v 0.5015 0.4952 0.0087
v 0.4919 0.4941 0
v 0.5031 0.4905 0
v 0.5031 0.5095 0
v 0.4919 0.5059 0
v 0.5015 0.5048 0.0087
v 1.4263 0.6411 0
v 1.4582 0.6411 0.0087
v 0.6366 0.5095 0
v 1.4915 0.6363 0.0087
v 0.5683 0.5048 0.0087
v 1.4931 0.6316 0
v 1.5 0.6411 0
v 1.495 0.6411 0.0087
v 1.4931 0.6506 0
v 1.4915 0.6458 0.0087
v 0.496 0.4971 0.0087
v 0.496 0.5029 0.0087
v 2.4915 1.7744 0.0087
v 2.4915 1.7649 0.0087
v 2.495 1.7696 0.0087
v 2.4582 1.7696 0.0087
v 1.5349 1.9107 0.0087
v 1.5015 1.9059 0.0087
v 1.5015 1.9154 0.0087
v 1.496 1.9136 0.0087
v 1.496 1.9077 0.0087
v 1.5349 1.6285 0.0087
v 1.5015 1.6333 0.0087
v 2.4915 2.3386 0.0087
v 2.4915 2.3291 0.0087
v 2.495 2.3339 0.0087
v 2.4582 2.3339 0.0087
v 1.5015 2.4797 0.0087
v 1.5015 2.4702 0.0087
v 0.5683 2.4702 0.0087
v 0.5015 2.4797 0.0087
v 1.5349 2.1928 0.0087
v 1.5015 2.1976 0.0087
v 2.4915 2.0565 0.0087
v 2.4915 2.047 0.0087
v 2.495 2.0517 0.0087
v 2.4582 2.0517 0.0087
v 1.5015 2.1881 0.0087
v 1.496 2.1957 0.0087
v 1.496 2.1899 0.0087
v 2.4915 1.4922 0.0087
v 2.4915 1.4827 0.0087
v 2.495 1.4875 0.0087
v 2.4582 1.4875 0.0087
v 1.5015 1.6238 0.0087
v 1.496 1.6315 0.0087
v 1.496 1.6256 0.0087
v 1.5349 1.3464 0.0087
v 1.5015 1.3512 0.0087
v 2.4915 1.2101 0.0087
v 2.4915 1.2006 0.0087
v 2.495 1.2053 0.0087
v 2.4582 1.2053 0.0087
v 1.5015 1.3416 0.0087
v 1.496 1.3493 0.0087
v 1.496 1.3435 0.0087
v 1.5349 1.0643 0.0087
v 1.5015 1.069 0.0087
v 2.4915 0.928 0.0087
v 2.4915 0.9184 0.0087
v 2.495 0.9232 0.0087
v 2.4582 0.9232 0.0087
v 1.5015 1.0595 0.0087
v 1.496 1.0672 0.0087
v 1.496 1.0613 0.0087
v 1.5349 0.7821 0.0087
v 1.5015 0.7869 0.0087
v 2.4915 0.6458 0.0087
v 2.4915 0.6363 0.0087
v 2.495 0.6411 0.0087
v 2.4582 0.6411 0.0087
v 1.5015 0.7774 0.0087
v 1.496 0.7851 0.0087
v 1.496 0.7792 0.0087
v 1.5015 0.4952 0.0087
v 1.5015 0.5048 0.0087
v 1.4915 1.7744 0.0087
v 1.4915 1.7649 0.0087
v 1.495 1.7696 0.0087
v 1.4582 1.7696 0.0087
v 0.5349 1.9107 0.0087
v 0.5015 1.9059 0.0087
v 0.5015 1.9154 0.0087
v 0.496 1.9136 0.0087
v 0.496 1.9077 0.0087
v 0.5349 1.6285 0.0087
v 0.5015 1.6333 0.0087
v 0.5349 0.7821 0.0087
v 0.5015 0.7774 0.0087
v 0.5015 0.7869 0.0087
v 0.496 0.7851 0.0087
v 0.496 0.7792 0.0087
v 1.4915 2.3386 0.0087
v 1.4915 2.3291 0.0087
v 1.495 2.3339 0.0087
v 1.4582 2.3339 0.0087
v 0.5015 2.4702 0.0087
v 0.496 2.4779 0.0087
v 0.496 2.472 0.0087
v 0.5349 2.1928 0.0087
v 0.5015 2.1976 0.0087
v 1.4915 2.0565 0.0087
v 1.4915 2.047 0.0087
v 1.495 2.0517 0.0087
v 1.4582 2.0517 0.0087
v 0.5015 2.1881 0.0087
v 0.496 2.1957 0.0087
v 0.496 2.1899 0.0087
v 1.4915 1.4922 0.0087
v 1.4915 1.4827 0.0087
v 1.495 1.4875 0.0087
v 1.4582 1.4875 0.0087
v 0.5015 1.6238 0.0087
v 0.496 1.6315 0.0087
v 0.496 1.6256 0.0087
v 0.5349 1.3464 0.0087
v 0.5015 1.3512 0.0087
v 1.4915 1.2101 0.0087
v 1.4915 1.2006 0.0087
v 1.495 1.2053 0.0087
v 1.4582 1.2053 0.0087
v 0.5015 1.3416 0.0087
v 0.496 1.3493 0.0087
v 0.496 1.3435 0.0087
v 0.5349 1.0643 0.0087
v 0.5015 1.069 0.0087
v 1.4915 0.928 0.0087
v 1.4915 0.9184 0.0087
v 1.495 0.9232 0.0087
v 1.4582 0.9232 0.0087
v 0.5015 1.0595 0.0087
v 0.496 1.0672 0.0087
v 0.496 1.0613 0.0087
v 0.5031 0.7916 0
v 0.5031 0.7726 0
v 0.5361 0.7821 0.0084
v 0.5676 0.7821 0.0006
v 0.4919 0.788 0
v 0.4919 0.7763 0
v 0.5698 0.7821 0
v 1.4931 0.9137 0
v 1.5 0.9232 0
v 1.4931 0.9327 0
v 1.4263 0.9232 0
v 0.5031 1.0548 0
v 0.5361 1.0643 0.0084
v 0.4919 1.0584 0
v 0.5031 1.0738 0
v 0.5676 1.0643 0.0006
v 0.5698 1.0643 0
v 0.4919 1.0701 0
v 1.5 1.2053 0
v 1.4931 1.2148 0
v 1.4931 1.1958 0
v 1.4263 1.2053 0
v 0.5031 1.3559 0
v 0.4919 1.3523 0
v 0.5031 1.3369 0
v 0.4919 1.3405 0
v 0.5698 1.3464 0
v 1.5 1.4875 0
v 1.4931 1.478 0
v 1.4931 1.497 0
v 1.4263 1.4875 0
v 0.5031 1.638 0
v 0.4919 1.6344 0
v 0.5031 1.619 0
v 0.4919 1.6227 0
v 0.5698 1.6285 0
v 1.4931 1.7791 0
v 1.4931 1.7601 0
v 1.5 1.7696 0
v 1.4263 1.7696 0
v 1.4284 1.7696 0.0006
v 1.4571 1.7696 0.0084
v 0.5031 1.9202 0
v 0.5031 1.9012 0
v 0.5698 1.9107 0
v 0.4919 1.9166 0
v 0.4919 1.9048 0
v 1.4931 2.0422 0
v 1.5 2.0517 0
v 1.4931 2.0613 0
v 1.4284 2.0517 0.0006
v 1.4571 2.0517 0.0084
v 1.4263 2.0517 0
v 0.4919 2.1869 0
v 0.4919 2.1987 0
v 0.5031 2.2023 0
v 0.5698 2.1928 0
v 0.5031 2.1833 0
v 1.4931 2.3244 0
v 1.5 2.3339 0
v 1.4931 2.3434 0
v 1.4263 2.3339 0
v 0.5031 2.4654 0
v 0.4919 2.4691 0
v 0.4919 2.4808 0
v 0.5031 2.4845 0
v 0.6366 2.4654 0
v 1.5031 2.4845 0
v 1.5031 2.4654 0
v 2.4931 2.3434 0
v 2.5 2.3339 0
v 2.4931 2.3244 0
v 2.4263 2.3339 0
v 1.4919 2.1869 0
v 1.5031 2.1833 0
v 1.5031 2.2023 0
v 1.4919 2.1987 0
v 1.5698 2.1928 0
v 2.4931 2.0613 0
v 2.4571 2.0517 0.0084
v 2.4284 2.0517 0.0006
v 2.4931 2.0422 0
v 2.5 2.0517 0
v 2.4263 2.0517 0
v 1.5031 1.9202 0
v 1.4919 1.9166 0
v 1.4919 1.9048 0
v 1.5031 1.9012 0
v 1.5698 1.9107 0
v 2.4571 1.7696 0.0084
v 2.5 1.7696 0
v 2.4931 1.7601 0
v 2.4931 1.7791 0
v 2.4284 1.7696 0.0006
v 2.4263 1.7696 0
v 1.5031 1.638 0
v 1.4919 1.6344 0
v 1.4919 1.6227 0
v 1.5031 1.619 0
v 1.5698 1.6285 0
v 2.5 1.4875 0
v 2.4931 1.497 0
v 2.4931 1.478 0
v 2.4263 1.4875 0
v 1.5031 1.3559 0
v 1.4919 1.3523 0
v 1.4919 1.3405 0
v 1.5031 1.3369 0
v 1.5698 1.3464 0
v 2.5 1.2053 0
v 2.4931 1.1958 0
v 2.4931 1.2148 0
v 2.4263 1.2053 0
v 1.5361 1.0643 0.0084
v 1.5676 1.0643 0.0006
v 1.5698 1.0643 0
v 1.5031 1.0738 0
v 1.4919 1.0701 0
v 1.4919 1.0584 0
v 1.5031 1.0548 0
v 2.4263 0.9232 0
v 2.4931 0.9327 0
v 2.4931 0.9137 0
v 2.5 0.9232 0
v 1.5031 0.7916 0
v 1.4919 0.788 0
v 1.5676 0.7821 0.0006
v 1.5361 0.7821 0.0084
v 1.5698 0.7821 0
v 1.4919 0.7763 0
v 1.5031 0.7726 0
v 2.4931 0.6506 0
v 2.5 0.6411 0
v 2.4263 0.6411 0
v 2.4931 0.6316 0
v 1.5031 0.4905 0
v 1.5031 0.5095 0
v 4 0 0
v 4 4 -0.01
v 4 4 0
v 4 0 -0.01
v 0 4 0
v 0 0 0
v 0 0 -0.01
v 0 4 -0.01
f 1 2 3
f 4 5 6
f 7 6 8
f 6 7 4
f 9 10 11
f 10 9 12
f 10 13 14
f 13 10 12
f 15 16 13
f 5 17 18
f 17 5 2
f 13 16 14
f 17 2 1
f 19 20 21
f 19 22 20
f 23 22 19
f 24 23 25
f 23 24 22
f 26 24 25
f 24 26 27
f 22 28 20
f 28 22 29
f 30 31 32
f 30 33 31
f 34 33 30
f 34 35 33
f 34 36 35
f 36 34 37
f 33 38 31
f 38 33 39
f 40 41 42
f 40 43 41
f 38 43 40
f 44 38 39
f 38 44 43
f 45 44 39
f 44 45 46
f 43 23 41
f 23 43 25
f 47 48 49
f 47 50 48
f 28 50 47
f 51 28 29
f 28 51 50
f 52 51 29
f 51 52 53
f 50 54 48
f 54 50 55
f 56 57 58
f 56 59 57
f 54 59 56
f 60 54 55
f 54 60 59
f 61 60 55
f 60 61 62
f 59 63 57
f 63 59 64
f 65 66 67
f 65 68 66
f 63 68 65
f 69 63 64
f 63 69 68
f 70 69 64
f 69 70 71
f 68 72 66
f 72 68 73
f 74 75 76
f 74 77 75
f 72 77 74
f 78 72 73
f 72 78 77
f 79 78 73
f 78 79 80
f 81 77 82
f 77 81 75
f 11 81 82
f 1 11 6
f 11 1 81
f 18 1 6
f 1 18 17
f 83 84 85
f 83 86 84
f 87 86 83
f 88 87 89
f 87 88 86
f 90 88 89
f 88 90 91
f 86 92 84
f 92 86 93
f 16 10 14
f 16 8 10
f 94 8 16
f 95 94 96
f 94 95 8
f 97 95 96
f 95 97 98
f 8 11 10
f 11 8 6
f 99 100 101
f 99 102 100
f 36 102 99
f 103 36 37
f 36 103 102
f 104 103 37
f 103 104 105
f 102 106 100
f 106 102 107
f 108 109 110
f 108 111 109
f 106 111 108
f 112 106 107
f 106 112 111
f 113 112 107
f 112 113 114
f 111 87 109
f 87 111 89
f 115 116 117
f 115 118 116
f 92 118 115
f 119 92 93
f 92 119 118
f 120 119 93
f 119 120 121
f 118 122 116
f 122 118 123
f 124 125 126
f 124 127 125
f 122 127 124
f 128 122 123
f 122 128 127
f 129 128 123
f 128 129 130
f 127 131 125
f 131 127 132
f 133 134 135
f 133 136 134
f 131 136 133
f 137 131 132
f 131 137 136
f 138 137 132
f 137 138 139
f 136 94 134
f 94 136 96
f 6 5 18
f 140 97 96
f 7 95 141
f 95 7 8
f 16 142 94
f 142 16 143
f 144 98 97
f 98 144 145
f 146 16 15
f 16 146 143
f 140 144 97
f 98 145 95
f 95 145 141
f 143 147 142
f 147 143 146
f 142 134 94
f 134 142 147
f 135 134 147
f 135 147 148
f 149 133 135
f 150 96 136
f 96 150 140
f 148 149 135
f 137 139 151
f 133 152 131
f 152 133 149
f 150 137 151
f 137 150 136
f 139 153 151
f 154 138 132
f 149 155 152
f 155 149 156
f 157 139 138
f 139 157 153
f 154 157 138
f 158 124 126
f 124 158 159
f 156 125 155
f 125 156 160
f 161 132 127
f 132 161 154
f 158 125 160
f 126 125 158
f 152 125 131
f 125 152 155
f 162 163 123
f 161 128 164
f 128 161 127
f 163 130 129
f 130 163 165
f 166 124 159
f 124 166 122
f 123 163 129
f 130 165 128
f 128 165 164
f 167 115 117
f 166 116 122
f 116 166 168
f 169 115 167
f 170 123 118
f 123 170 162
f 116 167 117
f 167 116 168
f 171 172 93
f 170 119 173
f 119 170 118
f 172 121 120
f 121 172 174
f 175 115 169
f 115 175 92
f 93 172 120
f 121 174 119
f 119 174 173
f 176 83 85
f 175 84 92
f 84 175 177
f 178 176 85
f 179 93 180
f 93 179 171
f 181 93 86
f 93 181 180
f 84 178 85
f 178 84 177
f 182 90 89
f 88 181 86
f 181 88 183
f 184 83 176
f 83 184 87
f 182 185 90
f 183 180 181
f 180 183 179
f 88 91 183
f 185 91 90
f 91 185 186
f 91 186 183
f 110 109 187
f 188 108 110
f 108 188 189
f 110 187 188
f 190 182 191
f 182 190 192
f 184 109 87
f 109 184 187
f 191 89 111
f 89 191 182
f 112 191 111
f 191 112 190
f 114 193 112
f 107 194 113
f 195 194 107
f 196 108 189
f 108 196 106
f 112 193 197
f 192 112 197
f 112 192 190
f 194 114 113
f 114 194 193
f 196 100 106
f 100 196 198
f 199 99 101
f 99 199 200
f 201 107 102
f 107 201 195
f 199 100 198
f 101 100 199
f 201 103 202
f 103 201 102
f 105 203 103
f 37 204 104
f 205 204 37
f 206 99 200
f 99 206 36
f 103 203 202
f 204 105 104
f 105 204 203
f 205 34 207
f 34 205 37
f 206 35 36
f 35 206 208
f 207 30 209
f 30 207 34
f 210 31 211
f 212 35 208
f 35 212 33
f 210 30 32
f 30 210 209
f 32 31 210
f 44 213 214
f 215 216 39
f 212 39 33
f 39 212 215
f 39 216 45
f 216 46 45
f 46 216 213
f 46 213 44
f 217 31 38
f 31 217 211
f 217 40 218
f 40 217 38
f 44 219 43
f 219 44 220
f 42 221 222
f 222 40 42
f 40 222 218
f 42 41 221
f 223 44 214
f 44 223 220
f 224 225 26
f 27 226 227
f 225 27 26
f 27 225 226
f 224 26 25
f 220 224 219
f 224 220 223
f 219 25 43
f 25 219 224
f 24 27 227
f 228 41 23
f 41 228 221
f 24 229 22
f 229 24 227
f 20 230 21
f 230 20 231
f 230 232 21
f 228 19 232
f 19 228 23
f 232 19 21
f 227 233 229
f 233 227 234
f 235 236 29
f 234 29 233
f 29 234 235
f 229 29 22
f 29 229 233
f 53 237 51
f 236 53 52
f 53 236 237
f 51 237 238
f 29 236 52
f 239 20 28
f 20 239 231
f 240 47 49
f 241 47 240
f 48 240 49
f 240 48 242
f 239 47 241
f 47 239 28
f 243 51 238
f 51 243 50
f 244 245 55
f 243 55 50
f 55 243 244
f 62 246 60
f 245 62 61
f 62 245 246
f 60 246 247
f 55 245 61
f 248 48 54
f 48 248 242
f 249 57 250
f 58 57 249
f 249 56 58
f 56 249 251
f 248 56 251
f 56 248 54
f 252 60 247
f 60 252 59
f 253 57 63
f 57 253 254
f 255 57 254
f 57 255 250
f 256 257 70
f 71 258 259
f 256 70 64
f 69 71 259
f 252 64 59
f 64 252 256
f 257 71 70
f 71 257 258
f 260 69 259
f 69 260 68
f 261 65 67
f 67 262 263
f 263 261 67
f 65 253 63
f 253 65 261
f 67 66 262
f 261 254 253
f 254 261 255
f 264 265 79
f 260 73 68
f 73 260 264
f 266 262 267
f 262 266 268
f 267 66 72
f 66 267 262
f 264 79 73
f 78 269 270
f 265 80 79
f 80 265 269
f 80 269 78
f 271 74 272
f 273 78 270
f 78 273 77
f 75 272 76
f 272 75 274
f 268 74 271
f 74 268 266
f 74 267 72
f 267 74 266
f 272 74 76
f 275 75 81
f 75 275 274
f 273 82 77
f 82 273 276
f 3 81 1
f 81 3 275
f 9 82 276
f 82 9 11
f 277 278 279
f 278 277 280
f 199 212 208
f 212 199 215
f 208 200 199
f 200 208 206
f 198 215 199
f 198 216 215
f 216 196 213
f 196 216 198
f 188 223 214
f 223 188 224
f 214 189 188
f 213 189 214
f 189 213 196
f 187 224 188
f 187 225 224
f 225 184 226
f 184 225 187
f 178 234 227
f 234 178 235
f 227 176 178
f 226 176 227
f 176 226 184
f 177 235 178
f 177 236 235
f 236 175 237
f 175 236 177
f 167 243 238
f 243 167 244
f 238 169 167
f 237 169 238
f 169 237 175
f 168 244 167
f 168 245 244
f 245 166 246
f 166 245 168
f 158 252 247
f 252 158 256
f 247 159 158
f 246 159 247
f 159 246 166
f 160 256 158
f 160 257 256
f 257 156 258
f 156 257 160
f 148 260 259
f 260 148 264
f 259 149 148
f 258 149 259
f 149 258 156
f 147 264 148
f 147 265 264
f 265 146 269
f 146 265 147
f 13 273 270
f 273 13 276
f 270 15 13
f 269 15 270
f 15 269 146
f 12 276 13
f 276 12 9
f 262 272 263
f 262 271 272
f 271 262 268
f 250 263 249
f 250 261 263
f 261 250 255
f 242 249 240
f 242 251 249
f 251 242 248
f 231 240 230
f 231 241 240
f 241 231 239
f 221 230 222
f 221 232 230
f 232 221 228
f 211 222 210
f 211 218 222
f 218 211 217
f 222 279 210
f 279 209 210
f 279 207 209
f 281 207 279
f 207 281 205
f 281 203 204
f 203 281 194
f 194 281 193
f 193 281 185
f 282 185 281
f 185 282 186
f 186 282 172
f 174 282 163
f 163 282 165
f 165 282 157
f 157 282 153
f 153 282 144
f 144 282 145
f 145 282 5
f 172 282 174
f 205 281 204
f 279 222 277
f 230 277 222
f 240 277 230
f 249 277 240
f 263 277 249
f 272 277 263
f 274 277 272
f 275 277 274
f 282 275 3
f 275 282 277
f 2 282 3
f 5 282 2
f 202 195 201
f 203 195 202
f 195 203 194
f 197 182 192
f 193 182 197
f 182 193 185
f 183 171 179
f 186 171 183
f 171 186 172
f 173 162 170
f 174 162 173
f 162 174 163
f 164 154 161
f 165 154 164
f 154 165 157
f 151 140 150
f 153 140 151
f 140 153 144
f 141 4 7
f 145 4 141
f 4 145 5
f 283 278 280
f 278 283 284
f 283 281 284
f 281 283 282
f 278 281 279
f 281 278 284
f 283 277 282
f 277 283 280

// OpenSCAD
hull(){
    translate([0.5, 0.5]) sphere(0.01);
    translate([1.49, 0.64106736]) sphere(0.01);
}
hull(){
    translate([1.49, 0.64106736]) sphere(0.01);
    translate([0.5, 0.78213472]) sphere(0.01);
}
hull(){
    translate([0.5, 0.78213472]) sphere(0.01);
    translate([1.49, 0.92320208]) sphere(0.01);
}
hull(){
    translate([1.49, 0.92320208]) sphere(0.01);
    translate([0.5, 1.06426944]) sphere(0.01);
}
hull(){
    translate([0.5, 1.06426944]) sphere(0.01);
    translate([1.49, 1.2053368]) sphere(0.01);
}
hull(){
    translate([1.49, 1.2053368]) sphere(0.01);
    translate([0.5, 1.34640416]) sphere(0.01);
}
hull(){
    translate([0.5, 1.34640416]) sphere(0.01);
    translate([1.49, 1.48747152]) sphere(0.01);
}
hull(){
    translate([1.49, 1.48747152]) sphere(0.01);
    translate([0.5, 1.62853888]) sphere(0.01);
}
hull(){
    translate([0.5, 1.62853888]) sphere(0.01);
    translate([1.49, 1.76960624]) sphere(0.01);
}
hull(){
    translate([1.49, 1.76960624]) sphere(0.01);
    translate([0.5, 1.9106736]) sphere(0.01);
}
hull(){
    translate([0.5, 1.9106736]) sphere(0.01);
    translate([1.49, 2.05174096]) sphere(0.01);
}
hull(){
    translate([1.49, 2.05174096]) sphere(0.01);
    translate([0.5, 2.19280832]) sphere(0.01);
}
hull(){
    translate([0.5, 2.19280832]) sphere(0.01);
    translate([1.49, 2.33387568]) sphere(0.01);
}
hull(){
    translate([1.49, 2.33387568]) sphere(0.01);
    translate([0.5, 2.47494304]) sphere(0.01);
}
hull(){
    translate([0.5, 2.47494304]) sphere(0.01);
    translate([1.5, 2.47494304]) sphere(0.01);
}
hull(){
    translate([1.5, 2.47494304]) sphere(0.01);
    translate([2.49, 2.33387568]) sphere(0.01);
}
hull(){
    translate([2.49, 2.33387568]) sphere(0.01);
    translate([1.5, 2.19280832]) sphere(0.01);
}
hull(){
    translate([1.5, 2.19280832]) sphere(0.01);
    translate([2.49, 2.05174096]) sphere(0.01);
}
hull(){
    translate([2.49, 2.05174096]) sphere(0.01);
    translate([1.5, 1.9106736]) sphere(0.01);
}
hull(){
    translate([1.5, 1.9106736]) sphere(0.01);
    translate([2.49, 1.76960624]) sphere(0.01);
}
hull(){
    translate([2.49, 1.76960624]) sphere(0.01);
    translate([1.5, 1.62853888]) sphere(0.01);
}
hull(){
    translate([1.5, 1.62853888]) sphere(0.01);
    translate([2.49, 1.48747152]) sphere(0.01);
}
hull(){
    translate([2.49, 1.48747152]) sphere(0.01);
    translate([1.5, 1.34640416]) sphere(0.01);
}
hull(){
    translate([1.5, 1.34640416]) sphere(0.01);
    translate([2.49, 1.2053368]) sphere(0.01);
}
hull(){
    translate([2.49, 1.2053368]) sphere(0.01);
    translate([1.5, 1.06426944]) sphere(0.01);
}
hull(){
    translate([1.5, 1.06426944]) sphere(0.01);
    translate([2.49, 0.92320208]) sphere(0.01);
}
hull(){
    translate([2.49, 0.92320208]) sphere(0.01);
    translate([1.5, 0.78213472]) sphere(0.01);
}
hull(){
    translate([1.5, 0.78213472]) sphere(0.01);
    translate([2.49, 0.64106736]) sphere(0.01);
}
hull(){
    translate([2.49, 0.64106736]) sphere(0.01);
    translate([1.5, 0.5]) sphere(0.01);
}
hull(){
    translate([1.5, 0.5]) sphere(0.01);
    translate([0.5, 0.5]) sphere(0.01);
}
translate([0,0,-0.01]) color([0.1,0.1,0.1]) cube([4,4,0.01]);
